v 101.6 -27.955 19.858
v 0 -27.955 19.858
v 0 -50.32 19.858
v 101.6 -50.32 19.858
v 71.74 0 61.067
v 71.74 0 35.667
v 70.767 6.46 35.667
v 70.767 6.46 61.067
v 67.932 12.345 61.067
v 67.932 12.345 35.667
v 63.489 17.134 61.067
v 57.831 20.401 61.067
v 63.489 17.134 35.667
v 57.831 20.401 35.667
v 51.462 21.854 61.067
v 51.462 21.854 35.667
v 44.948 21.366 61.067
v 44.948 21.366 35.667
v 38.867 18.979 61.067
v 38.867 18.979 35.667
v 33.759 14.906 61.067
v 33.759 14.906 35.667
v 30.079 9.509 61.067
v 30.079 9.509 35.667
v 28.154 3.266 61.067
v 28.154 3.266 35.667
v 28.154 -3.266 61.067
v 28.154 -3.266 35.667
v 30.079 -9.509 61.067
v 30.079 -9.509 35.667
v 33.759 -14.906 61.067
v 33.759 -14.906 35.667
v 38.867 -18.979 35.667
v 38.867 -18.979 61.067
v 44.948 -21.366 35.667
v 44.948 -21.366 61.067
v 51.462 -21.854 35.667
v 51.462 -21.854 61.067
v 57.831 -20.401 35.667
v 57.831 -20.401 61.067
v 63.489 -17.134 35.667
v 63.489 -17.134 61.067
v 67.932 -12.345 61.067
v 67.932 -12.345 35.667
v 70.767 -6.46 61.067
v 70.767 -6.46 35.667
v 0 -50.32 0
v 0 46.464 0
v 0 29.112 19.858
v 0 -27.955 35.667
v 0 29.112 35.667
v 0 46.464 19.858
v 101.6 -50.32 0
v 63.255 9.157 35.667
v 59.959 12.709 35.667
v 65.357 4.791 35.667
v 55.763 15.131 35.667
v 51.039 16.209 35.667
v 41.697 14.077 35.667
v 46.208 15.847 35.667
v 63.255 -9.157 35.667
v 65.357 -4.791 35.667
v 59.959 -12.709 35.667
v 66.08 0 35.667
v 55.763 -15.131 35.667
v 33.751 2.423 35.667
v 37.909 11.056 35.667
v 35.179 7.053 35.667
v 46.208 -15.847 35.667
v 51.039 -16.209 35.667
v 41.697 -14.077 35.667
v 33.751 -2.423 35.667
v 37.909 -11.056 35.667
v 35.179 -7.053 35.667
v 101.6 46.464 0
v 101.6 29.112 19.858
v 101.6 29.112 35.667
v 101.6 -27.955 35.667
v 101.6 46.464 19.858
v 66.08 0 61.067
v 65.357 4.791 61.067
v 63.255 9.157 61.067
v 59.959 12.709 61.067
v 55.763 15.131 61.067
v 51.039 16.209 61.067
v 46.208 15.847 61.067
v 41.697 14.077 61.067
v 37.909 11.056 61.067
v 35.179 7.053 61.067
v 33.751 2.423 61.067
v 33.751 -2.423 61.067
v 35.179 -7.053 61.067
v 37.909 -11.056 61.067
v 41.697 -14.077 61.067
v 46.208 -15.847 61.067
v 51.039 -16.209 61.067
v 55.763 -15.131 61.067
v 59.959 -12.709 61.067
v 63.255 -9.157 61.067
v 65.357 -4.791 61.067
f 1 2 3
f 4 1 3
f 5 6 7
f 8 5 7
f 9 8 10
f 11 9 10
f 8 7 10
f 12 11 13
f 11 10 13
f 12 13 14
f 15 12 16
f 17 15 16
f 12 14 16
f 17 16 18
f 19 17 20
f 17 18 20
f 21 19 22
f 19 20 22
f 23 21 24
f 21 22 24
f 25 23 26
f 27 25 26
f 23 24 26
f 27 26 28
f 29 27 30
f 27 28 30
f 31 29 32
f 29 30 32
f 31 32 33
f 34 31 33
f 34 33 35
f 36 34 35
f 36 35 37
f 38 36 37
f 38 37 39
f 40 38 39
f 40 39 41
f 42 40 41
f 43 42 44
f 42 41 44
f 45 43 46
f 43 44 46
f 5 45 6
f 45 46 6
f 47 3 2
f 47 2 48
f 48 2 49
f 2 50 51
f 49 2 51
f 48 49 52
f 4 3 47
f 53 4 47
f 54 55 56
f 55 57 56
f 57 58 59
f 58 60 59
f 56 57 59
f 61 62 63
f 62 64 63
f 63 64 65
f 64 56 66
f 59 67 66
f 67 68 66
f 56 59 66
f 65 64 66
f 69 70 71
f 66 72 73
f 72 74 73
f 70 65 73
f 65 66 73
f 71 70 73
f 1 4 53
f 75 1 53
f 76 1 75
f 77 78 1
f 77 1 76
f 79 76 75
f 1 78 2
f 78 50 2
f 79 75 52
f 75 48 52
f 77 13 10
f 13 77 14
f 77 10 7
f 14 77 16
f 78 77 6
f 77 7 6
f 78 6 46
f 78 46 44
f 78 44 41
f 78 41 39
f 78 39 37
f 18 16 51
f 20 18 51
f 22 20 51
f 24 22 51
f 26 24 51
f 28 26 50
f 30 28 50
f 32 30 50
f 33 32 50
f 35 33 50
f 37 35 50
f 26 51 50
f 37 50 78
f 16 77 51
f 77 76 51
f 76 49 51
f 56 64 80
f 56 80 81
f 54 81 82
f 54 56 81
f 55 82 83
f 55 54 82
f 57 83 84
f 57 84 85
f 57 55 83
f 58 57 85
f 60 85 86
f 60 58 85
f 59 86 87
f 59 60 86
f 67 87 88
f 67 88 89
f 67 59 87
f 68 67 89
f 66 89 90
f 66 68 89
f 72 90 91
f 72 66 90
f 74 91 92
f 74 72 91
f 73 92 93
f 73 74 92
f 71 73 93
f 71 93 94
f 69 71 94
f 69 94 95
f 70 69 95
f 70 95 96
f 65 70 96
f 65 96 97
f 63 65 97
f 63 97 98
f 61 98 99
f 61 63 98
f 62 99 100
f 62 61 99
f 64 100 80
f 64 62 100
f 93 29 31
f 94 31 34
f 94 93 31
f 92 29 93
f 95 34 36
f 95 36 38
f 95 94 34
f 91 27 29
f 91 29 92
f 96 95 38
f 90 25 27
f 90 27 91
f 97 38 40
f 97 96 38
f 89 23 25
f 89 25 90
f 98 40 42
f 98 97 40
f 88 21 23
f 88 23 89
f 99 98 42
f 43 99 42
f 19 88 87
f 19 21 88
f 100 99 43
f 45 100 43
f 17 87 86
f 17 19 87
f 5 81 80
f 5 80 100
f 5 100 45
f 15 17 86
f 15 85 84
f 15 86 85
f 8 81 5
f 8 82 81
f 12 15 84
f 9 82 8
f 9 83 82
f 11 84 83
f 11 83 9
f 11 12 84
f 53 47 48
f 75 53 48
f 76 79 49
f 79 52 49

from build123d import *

# Parameters (mm, degrees)
F1_DEPTH      = 25.4
F2_DEPTH      = 25.4
F3_DEPTH      = 25.4
F4_DEPTH      = 25.4
F6_R          = 21.9155867699
F6_R_2        = 16.2549330377
F7_DEPTH      = 25.4
F7_DEPTH_BACK = 25.4


with BuildPart() as f1:
    # F0 (on Right) → F1 (new body)
    with BuildSketch(Plane.YZ):
        Polygon((-50.3195412457, 0), (0, 0), (46.4636348188, 0), (46.4636348188, 19.8579039425), (29.1120689362, 19.8579039425), (29.1120689362, 35.6671102345), (-27.955301106, 35.6671102345), (-27.955301106, 19.8579039425), (-50.3195412457, 19.8579039425), align=None)
    extrude(amount=F1_DEPTH)

    # F2 (add): a face of the model
    f2_faces = [f1.faces().sort_by_distance(p)[0] for p in [
        (25.4, -1.1272764722, 15.6260757274),
    ]]
    extrude(f2_faces, amount=F2_DEPTH)

    # F3 (add): a face of the model
    f3_faces = [f1.faces().sort_by_distance(p)[0] for p in [
        (50.8, -1.1272764722, 15.6260757274),
    ]]
    extrude(f3_faces, amount=F3_DEPTH)

    # F4 (add): a face of the model
    f4_faces = [f1.faces().sort_by_distance(p)[0] for p in [
        (76.2, -1.1272764722, 15.6260757274),
    ]]
    extrude(f4_faces, amount=F4_DEPTH)

    # F6 (on face) → F7 (join, two sides)
    with BuildSketch(Plane.XY.offset(35.6671102345)) as f7_sk:
        with Locations((49.8246699572, 0)):
            Circle(F6_R)
        with Locations((49.8246699572, 0)):
            Circle(F6_R_2, mode=Mode.SUBTRACT)
    extrude(amount=F7_DEPTH)
    extrude(f7_sk.sketch, amount=-F7_DEPTH_BACK)


solid = f1.part
